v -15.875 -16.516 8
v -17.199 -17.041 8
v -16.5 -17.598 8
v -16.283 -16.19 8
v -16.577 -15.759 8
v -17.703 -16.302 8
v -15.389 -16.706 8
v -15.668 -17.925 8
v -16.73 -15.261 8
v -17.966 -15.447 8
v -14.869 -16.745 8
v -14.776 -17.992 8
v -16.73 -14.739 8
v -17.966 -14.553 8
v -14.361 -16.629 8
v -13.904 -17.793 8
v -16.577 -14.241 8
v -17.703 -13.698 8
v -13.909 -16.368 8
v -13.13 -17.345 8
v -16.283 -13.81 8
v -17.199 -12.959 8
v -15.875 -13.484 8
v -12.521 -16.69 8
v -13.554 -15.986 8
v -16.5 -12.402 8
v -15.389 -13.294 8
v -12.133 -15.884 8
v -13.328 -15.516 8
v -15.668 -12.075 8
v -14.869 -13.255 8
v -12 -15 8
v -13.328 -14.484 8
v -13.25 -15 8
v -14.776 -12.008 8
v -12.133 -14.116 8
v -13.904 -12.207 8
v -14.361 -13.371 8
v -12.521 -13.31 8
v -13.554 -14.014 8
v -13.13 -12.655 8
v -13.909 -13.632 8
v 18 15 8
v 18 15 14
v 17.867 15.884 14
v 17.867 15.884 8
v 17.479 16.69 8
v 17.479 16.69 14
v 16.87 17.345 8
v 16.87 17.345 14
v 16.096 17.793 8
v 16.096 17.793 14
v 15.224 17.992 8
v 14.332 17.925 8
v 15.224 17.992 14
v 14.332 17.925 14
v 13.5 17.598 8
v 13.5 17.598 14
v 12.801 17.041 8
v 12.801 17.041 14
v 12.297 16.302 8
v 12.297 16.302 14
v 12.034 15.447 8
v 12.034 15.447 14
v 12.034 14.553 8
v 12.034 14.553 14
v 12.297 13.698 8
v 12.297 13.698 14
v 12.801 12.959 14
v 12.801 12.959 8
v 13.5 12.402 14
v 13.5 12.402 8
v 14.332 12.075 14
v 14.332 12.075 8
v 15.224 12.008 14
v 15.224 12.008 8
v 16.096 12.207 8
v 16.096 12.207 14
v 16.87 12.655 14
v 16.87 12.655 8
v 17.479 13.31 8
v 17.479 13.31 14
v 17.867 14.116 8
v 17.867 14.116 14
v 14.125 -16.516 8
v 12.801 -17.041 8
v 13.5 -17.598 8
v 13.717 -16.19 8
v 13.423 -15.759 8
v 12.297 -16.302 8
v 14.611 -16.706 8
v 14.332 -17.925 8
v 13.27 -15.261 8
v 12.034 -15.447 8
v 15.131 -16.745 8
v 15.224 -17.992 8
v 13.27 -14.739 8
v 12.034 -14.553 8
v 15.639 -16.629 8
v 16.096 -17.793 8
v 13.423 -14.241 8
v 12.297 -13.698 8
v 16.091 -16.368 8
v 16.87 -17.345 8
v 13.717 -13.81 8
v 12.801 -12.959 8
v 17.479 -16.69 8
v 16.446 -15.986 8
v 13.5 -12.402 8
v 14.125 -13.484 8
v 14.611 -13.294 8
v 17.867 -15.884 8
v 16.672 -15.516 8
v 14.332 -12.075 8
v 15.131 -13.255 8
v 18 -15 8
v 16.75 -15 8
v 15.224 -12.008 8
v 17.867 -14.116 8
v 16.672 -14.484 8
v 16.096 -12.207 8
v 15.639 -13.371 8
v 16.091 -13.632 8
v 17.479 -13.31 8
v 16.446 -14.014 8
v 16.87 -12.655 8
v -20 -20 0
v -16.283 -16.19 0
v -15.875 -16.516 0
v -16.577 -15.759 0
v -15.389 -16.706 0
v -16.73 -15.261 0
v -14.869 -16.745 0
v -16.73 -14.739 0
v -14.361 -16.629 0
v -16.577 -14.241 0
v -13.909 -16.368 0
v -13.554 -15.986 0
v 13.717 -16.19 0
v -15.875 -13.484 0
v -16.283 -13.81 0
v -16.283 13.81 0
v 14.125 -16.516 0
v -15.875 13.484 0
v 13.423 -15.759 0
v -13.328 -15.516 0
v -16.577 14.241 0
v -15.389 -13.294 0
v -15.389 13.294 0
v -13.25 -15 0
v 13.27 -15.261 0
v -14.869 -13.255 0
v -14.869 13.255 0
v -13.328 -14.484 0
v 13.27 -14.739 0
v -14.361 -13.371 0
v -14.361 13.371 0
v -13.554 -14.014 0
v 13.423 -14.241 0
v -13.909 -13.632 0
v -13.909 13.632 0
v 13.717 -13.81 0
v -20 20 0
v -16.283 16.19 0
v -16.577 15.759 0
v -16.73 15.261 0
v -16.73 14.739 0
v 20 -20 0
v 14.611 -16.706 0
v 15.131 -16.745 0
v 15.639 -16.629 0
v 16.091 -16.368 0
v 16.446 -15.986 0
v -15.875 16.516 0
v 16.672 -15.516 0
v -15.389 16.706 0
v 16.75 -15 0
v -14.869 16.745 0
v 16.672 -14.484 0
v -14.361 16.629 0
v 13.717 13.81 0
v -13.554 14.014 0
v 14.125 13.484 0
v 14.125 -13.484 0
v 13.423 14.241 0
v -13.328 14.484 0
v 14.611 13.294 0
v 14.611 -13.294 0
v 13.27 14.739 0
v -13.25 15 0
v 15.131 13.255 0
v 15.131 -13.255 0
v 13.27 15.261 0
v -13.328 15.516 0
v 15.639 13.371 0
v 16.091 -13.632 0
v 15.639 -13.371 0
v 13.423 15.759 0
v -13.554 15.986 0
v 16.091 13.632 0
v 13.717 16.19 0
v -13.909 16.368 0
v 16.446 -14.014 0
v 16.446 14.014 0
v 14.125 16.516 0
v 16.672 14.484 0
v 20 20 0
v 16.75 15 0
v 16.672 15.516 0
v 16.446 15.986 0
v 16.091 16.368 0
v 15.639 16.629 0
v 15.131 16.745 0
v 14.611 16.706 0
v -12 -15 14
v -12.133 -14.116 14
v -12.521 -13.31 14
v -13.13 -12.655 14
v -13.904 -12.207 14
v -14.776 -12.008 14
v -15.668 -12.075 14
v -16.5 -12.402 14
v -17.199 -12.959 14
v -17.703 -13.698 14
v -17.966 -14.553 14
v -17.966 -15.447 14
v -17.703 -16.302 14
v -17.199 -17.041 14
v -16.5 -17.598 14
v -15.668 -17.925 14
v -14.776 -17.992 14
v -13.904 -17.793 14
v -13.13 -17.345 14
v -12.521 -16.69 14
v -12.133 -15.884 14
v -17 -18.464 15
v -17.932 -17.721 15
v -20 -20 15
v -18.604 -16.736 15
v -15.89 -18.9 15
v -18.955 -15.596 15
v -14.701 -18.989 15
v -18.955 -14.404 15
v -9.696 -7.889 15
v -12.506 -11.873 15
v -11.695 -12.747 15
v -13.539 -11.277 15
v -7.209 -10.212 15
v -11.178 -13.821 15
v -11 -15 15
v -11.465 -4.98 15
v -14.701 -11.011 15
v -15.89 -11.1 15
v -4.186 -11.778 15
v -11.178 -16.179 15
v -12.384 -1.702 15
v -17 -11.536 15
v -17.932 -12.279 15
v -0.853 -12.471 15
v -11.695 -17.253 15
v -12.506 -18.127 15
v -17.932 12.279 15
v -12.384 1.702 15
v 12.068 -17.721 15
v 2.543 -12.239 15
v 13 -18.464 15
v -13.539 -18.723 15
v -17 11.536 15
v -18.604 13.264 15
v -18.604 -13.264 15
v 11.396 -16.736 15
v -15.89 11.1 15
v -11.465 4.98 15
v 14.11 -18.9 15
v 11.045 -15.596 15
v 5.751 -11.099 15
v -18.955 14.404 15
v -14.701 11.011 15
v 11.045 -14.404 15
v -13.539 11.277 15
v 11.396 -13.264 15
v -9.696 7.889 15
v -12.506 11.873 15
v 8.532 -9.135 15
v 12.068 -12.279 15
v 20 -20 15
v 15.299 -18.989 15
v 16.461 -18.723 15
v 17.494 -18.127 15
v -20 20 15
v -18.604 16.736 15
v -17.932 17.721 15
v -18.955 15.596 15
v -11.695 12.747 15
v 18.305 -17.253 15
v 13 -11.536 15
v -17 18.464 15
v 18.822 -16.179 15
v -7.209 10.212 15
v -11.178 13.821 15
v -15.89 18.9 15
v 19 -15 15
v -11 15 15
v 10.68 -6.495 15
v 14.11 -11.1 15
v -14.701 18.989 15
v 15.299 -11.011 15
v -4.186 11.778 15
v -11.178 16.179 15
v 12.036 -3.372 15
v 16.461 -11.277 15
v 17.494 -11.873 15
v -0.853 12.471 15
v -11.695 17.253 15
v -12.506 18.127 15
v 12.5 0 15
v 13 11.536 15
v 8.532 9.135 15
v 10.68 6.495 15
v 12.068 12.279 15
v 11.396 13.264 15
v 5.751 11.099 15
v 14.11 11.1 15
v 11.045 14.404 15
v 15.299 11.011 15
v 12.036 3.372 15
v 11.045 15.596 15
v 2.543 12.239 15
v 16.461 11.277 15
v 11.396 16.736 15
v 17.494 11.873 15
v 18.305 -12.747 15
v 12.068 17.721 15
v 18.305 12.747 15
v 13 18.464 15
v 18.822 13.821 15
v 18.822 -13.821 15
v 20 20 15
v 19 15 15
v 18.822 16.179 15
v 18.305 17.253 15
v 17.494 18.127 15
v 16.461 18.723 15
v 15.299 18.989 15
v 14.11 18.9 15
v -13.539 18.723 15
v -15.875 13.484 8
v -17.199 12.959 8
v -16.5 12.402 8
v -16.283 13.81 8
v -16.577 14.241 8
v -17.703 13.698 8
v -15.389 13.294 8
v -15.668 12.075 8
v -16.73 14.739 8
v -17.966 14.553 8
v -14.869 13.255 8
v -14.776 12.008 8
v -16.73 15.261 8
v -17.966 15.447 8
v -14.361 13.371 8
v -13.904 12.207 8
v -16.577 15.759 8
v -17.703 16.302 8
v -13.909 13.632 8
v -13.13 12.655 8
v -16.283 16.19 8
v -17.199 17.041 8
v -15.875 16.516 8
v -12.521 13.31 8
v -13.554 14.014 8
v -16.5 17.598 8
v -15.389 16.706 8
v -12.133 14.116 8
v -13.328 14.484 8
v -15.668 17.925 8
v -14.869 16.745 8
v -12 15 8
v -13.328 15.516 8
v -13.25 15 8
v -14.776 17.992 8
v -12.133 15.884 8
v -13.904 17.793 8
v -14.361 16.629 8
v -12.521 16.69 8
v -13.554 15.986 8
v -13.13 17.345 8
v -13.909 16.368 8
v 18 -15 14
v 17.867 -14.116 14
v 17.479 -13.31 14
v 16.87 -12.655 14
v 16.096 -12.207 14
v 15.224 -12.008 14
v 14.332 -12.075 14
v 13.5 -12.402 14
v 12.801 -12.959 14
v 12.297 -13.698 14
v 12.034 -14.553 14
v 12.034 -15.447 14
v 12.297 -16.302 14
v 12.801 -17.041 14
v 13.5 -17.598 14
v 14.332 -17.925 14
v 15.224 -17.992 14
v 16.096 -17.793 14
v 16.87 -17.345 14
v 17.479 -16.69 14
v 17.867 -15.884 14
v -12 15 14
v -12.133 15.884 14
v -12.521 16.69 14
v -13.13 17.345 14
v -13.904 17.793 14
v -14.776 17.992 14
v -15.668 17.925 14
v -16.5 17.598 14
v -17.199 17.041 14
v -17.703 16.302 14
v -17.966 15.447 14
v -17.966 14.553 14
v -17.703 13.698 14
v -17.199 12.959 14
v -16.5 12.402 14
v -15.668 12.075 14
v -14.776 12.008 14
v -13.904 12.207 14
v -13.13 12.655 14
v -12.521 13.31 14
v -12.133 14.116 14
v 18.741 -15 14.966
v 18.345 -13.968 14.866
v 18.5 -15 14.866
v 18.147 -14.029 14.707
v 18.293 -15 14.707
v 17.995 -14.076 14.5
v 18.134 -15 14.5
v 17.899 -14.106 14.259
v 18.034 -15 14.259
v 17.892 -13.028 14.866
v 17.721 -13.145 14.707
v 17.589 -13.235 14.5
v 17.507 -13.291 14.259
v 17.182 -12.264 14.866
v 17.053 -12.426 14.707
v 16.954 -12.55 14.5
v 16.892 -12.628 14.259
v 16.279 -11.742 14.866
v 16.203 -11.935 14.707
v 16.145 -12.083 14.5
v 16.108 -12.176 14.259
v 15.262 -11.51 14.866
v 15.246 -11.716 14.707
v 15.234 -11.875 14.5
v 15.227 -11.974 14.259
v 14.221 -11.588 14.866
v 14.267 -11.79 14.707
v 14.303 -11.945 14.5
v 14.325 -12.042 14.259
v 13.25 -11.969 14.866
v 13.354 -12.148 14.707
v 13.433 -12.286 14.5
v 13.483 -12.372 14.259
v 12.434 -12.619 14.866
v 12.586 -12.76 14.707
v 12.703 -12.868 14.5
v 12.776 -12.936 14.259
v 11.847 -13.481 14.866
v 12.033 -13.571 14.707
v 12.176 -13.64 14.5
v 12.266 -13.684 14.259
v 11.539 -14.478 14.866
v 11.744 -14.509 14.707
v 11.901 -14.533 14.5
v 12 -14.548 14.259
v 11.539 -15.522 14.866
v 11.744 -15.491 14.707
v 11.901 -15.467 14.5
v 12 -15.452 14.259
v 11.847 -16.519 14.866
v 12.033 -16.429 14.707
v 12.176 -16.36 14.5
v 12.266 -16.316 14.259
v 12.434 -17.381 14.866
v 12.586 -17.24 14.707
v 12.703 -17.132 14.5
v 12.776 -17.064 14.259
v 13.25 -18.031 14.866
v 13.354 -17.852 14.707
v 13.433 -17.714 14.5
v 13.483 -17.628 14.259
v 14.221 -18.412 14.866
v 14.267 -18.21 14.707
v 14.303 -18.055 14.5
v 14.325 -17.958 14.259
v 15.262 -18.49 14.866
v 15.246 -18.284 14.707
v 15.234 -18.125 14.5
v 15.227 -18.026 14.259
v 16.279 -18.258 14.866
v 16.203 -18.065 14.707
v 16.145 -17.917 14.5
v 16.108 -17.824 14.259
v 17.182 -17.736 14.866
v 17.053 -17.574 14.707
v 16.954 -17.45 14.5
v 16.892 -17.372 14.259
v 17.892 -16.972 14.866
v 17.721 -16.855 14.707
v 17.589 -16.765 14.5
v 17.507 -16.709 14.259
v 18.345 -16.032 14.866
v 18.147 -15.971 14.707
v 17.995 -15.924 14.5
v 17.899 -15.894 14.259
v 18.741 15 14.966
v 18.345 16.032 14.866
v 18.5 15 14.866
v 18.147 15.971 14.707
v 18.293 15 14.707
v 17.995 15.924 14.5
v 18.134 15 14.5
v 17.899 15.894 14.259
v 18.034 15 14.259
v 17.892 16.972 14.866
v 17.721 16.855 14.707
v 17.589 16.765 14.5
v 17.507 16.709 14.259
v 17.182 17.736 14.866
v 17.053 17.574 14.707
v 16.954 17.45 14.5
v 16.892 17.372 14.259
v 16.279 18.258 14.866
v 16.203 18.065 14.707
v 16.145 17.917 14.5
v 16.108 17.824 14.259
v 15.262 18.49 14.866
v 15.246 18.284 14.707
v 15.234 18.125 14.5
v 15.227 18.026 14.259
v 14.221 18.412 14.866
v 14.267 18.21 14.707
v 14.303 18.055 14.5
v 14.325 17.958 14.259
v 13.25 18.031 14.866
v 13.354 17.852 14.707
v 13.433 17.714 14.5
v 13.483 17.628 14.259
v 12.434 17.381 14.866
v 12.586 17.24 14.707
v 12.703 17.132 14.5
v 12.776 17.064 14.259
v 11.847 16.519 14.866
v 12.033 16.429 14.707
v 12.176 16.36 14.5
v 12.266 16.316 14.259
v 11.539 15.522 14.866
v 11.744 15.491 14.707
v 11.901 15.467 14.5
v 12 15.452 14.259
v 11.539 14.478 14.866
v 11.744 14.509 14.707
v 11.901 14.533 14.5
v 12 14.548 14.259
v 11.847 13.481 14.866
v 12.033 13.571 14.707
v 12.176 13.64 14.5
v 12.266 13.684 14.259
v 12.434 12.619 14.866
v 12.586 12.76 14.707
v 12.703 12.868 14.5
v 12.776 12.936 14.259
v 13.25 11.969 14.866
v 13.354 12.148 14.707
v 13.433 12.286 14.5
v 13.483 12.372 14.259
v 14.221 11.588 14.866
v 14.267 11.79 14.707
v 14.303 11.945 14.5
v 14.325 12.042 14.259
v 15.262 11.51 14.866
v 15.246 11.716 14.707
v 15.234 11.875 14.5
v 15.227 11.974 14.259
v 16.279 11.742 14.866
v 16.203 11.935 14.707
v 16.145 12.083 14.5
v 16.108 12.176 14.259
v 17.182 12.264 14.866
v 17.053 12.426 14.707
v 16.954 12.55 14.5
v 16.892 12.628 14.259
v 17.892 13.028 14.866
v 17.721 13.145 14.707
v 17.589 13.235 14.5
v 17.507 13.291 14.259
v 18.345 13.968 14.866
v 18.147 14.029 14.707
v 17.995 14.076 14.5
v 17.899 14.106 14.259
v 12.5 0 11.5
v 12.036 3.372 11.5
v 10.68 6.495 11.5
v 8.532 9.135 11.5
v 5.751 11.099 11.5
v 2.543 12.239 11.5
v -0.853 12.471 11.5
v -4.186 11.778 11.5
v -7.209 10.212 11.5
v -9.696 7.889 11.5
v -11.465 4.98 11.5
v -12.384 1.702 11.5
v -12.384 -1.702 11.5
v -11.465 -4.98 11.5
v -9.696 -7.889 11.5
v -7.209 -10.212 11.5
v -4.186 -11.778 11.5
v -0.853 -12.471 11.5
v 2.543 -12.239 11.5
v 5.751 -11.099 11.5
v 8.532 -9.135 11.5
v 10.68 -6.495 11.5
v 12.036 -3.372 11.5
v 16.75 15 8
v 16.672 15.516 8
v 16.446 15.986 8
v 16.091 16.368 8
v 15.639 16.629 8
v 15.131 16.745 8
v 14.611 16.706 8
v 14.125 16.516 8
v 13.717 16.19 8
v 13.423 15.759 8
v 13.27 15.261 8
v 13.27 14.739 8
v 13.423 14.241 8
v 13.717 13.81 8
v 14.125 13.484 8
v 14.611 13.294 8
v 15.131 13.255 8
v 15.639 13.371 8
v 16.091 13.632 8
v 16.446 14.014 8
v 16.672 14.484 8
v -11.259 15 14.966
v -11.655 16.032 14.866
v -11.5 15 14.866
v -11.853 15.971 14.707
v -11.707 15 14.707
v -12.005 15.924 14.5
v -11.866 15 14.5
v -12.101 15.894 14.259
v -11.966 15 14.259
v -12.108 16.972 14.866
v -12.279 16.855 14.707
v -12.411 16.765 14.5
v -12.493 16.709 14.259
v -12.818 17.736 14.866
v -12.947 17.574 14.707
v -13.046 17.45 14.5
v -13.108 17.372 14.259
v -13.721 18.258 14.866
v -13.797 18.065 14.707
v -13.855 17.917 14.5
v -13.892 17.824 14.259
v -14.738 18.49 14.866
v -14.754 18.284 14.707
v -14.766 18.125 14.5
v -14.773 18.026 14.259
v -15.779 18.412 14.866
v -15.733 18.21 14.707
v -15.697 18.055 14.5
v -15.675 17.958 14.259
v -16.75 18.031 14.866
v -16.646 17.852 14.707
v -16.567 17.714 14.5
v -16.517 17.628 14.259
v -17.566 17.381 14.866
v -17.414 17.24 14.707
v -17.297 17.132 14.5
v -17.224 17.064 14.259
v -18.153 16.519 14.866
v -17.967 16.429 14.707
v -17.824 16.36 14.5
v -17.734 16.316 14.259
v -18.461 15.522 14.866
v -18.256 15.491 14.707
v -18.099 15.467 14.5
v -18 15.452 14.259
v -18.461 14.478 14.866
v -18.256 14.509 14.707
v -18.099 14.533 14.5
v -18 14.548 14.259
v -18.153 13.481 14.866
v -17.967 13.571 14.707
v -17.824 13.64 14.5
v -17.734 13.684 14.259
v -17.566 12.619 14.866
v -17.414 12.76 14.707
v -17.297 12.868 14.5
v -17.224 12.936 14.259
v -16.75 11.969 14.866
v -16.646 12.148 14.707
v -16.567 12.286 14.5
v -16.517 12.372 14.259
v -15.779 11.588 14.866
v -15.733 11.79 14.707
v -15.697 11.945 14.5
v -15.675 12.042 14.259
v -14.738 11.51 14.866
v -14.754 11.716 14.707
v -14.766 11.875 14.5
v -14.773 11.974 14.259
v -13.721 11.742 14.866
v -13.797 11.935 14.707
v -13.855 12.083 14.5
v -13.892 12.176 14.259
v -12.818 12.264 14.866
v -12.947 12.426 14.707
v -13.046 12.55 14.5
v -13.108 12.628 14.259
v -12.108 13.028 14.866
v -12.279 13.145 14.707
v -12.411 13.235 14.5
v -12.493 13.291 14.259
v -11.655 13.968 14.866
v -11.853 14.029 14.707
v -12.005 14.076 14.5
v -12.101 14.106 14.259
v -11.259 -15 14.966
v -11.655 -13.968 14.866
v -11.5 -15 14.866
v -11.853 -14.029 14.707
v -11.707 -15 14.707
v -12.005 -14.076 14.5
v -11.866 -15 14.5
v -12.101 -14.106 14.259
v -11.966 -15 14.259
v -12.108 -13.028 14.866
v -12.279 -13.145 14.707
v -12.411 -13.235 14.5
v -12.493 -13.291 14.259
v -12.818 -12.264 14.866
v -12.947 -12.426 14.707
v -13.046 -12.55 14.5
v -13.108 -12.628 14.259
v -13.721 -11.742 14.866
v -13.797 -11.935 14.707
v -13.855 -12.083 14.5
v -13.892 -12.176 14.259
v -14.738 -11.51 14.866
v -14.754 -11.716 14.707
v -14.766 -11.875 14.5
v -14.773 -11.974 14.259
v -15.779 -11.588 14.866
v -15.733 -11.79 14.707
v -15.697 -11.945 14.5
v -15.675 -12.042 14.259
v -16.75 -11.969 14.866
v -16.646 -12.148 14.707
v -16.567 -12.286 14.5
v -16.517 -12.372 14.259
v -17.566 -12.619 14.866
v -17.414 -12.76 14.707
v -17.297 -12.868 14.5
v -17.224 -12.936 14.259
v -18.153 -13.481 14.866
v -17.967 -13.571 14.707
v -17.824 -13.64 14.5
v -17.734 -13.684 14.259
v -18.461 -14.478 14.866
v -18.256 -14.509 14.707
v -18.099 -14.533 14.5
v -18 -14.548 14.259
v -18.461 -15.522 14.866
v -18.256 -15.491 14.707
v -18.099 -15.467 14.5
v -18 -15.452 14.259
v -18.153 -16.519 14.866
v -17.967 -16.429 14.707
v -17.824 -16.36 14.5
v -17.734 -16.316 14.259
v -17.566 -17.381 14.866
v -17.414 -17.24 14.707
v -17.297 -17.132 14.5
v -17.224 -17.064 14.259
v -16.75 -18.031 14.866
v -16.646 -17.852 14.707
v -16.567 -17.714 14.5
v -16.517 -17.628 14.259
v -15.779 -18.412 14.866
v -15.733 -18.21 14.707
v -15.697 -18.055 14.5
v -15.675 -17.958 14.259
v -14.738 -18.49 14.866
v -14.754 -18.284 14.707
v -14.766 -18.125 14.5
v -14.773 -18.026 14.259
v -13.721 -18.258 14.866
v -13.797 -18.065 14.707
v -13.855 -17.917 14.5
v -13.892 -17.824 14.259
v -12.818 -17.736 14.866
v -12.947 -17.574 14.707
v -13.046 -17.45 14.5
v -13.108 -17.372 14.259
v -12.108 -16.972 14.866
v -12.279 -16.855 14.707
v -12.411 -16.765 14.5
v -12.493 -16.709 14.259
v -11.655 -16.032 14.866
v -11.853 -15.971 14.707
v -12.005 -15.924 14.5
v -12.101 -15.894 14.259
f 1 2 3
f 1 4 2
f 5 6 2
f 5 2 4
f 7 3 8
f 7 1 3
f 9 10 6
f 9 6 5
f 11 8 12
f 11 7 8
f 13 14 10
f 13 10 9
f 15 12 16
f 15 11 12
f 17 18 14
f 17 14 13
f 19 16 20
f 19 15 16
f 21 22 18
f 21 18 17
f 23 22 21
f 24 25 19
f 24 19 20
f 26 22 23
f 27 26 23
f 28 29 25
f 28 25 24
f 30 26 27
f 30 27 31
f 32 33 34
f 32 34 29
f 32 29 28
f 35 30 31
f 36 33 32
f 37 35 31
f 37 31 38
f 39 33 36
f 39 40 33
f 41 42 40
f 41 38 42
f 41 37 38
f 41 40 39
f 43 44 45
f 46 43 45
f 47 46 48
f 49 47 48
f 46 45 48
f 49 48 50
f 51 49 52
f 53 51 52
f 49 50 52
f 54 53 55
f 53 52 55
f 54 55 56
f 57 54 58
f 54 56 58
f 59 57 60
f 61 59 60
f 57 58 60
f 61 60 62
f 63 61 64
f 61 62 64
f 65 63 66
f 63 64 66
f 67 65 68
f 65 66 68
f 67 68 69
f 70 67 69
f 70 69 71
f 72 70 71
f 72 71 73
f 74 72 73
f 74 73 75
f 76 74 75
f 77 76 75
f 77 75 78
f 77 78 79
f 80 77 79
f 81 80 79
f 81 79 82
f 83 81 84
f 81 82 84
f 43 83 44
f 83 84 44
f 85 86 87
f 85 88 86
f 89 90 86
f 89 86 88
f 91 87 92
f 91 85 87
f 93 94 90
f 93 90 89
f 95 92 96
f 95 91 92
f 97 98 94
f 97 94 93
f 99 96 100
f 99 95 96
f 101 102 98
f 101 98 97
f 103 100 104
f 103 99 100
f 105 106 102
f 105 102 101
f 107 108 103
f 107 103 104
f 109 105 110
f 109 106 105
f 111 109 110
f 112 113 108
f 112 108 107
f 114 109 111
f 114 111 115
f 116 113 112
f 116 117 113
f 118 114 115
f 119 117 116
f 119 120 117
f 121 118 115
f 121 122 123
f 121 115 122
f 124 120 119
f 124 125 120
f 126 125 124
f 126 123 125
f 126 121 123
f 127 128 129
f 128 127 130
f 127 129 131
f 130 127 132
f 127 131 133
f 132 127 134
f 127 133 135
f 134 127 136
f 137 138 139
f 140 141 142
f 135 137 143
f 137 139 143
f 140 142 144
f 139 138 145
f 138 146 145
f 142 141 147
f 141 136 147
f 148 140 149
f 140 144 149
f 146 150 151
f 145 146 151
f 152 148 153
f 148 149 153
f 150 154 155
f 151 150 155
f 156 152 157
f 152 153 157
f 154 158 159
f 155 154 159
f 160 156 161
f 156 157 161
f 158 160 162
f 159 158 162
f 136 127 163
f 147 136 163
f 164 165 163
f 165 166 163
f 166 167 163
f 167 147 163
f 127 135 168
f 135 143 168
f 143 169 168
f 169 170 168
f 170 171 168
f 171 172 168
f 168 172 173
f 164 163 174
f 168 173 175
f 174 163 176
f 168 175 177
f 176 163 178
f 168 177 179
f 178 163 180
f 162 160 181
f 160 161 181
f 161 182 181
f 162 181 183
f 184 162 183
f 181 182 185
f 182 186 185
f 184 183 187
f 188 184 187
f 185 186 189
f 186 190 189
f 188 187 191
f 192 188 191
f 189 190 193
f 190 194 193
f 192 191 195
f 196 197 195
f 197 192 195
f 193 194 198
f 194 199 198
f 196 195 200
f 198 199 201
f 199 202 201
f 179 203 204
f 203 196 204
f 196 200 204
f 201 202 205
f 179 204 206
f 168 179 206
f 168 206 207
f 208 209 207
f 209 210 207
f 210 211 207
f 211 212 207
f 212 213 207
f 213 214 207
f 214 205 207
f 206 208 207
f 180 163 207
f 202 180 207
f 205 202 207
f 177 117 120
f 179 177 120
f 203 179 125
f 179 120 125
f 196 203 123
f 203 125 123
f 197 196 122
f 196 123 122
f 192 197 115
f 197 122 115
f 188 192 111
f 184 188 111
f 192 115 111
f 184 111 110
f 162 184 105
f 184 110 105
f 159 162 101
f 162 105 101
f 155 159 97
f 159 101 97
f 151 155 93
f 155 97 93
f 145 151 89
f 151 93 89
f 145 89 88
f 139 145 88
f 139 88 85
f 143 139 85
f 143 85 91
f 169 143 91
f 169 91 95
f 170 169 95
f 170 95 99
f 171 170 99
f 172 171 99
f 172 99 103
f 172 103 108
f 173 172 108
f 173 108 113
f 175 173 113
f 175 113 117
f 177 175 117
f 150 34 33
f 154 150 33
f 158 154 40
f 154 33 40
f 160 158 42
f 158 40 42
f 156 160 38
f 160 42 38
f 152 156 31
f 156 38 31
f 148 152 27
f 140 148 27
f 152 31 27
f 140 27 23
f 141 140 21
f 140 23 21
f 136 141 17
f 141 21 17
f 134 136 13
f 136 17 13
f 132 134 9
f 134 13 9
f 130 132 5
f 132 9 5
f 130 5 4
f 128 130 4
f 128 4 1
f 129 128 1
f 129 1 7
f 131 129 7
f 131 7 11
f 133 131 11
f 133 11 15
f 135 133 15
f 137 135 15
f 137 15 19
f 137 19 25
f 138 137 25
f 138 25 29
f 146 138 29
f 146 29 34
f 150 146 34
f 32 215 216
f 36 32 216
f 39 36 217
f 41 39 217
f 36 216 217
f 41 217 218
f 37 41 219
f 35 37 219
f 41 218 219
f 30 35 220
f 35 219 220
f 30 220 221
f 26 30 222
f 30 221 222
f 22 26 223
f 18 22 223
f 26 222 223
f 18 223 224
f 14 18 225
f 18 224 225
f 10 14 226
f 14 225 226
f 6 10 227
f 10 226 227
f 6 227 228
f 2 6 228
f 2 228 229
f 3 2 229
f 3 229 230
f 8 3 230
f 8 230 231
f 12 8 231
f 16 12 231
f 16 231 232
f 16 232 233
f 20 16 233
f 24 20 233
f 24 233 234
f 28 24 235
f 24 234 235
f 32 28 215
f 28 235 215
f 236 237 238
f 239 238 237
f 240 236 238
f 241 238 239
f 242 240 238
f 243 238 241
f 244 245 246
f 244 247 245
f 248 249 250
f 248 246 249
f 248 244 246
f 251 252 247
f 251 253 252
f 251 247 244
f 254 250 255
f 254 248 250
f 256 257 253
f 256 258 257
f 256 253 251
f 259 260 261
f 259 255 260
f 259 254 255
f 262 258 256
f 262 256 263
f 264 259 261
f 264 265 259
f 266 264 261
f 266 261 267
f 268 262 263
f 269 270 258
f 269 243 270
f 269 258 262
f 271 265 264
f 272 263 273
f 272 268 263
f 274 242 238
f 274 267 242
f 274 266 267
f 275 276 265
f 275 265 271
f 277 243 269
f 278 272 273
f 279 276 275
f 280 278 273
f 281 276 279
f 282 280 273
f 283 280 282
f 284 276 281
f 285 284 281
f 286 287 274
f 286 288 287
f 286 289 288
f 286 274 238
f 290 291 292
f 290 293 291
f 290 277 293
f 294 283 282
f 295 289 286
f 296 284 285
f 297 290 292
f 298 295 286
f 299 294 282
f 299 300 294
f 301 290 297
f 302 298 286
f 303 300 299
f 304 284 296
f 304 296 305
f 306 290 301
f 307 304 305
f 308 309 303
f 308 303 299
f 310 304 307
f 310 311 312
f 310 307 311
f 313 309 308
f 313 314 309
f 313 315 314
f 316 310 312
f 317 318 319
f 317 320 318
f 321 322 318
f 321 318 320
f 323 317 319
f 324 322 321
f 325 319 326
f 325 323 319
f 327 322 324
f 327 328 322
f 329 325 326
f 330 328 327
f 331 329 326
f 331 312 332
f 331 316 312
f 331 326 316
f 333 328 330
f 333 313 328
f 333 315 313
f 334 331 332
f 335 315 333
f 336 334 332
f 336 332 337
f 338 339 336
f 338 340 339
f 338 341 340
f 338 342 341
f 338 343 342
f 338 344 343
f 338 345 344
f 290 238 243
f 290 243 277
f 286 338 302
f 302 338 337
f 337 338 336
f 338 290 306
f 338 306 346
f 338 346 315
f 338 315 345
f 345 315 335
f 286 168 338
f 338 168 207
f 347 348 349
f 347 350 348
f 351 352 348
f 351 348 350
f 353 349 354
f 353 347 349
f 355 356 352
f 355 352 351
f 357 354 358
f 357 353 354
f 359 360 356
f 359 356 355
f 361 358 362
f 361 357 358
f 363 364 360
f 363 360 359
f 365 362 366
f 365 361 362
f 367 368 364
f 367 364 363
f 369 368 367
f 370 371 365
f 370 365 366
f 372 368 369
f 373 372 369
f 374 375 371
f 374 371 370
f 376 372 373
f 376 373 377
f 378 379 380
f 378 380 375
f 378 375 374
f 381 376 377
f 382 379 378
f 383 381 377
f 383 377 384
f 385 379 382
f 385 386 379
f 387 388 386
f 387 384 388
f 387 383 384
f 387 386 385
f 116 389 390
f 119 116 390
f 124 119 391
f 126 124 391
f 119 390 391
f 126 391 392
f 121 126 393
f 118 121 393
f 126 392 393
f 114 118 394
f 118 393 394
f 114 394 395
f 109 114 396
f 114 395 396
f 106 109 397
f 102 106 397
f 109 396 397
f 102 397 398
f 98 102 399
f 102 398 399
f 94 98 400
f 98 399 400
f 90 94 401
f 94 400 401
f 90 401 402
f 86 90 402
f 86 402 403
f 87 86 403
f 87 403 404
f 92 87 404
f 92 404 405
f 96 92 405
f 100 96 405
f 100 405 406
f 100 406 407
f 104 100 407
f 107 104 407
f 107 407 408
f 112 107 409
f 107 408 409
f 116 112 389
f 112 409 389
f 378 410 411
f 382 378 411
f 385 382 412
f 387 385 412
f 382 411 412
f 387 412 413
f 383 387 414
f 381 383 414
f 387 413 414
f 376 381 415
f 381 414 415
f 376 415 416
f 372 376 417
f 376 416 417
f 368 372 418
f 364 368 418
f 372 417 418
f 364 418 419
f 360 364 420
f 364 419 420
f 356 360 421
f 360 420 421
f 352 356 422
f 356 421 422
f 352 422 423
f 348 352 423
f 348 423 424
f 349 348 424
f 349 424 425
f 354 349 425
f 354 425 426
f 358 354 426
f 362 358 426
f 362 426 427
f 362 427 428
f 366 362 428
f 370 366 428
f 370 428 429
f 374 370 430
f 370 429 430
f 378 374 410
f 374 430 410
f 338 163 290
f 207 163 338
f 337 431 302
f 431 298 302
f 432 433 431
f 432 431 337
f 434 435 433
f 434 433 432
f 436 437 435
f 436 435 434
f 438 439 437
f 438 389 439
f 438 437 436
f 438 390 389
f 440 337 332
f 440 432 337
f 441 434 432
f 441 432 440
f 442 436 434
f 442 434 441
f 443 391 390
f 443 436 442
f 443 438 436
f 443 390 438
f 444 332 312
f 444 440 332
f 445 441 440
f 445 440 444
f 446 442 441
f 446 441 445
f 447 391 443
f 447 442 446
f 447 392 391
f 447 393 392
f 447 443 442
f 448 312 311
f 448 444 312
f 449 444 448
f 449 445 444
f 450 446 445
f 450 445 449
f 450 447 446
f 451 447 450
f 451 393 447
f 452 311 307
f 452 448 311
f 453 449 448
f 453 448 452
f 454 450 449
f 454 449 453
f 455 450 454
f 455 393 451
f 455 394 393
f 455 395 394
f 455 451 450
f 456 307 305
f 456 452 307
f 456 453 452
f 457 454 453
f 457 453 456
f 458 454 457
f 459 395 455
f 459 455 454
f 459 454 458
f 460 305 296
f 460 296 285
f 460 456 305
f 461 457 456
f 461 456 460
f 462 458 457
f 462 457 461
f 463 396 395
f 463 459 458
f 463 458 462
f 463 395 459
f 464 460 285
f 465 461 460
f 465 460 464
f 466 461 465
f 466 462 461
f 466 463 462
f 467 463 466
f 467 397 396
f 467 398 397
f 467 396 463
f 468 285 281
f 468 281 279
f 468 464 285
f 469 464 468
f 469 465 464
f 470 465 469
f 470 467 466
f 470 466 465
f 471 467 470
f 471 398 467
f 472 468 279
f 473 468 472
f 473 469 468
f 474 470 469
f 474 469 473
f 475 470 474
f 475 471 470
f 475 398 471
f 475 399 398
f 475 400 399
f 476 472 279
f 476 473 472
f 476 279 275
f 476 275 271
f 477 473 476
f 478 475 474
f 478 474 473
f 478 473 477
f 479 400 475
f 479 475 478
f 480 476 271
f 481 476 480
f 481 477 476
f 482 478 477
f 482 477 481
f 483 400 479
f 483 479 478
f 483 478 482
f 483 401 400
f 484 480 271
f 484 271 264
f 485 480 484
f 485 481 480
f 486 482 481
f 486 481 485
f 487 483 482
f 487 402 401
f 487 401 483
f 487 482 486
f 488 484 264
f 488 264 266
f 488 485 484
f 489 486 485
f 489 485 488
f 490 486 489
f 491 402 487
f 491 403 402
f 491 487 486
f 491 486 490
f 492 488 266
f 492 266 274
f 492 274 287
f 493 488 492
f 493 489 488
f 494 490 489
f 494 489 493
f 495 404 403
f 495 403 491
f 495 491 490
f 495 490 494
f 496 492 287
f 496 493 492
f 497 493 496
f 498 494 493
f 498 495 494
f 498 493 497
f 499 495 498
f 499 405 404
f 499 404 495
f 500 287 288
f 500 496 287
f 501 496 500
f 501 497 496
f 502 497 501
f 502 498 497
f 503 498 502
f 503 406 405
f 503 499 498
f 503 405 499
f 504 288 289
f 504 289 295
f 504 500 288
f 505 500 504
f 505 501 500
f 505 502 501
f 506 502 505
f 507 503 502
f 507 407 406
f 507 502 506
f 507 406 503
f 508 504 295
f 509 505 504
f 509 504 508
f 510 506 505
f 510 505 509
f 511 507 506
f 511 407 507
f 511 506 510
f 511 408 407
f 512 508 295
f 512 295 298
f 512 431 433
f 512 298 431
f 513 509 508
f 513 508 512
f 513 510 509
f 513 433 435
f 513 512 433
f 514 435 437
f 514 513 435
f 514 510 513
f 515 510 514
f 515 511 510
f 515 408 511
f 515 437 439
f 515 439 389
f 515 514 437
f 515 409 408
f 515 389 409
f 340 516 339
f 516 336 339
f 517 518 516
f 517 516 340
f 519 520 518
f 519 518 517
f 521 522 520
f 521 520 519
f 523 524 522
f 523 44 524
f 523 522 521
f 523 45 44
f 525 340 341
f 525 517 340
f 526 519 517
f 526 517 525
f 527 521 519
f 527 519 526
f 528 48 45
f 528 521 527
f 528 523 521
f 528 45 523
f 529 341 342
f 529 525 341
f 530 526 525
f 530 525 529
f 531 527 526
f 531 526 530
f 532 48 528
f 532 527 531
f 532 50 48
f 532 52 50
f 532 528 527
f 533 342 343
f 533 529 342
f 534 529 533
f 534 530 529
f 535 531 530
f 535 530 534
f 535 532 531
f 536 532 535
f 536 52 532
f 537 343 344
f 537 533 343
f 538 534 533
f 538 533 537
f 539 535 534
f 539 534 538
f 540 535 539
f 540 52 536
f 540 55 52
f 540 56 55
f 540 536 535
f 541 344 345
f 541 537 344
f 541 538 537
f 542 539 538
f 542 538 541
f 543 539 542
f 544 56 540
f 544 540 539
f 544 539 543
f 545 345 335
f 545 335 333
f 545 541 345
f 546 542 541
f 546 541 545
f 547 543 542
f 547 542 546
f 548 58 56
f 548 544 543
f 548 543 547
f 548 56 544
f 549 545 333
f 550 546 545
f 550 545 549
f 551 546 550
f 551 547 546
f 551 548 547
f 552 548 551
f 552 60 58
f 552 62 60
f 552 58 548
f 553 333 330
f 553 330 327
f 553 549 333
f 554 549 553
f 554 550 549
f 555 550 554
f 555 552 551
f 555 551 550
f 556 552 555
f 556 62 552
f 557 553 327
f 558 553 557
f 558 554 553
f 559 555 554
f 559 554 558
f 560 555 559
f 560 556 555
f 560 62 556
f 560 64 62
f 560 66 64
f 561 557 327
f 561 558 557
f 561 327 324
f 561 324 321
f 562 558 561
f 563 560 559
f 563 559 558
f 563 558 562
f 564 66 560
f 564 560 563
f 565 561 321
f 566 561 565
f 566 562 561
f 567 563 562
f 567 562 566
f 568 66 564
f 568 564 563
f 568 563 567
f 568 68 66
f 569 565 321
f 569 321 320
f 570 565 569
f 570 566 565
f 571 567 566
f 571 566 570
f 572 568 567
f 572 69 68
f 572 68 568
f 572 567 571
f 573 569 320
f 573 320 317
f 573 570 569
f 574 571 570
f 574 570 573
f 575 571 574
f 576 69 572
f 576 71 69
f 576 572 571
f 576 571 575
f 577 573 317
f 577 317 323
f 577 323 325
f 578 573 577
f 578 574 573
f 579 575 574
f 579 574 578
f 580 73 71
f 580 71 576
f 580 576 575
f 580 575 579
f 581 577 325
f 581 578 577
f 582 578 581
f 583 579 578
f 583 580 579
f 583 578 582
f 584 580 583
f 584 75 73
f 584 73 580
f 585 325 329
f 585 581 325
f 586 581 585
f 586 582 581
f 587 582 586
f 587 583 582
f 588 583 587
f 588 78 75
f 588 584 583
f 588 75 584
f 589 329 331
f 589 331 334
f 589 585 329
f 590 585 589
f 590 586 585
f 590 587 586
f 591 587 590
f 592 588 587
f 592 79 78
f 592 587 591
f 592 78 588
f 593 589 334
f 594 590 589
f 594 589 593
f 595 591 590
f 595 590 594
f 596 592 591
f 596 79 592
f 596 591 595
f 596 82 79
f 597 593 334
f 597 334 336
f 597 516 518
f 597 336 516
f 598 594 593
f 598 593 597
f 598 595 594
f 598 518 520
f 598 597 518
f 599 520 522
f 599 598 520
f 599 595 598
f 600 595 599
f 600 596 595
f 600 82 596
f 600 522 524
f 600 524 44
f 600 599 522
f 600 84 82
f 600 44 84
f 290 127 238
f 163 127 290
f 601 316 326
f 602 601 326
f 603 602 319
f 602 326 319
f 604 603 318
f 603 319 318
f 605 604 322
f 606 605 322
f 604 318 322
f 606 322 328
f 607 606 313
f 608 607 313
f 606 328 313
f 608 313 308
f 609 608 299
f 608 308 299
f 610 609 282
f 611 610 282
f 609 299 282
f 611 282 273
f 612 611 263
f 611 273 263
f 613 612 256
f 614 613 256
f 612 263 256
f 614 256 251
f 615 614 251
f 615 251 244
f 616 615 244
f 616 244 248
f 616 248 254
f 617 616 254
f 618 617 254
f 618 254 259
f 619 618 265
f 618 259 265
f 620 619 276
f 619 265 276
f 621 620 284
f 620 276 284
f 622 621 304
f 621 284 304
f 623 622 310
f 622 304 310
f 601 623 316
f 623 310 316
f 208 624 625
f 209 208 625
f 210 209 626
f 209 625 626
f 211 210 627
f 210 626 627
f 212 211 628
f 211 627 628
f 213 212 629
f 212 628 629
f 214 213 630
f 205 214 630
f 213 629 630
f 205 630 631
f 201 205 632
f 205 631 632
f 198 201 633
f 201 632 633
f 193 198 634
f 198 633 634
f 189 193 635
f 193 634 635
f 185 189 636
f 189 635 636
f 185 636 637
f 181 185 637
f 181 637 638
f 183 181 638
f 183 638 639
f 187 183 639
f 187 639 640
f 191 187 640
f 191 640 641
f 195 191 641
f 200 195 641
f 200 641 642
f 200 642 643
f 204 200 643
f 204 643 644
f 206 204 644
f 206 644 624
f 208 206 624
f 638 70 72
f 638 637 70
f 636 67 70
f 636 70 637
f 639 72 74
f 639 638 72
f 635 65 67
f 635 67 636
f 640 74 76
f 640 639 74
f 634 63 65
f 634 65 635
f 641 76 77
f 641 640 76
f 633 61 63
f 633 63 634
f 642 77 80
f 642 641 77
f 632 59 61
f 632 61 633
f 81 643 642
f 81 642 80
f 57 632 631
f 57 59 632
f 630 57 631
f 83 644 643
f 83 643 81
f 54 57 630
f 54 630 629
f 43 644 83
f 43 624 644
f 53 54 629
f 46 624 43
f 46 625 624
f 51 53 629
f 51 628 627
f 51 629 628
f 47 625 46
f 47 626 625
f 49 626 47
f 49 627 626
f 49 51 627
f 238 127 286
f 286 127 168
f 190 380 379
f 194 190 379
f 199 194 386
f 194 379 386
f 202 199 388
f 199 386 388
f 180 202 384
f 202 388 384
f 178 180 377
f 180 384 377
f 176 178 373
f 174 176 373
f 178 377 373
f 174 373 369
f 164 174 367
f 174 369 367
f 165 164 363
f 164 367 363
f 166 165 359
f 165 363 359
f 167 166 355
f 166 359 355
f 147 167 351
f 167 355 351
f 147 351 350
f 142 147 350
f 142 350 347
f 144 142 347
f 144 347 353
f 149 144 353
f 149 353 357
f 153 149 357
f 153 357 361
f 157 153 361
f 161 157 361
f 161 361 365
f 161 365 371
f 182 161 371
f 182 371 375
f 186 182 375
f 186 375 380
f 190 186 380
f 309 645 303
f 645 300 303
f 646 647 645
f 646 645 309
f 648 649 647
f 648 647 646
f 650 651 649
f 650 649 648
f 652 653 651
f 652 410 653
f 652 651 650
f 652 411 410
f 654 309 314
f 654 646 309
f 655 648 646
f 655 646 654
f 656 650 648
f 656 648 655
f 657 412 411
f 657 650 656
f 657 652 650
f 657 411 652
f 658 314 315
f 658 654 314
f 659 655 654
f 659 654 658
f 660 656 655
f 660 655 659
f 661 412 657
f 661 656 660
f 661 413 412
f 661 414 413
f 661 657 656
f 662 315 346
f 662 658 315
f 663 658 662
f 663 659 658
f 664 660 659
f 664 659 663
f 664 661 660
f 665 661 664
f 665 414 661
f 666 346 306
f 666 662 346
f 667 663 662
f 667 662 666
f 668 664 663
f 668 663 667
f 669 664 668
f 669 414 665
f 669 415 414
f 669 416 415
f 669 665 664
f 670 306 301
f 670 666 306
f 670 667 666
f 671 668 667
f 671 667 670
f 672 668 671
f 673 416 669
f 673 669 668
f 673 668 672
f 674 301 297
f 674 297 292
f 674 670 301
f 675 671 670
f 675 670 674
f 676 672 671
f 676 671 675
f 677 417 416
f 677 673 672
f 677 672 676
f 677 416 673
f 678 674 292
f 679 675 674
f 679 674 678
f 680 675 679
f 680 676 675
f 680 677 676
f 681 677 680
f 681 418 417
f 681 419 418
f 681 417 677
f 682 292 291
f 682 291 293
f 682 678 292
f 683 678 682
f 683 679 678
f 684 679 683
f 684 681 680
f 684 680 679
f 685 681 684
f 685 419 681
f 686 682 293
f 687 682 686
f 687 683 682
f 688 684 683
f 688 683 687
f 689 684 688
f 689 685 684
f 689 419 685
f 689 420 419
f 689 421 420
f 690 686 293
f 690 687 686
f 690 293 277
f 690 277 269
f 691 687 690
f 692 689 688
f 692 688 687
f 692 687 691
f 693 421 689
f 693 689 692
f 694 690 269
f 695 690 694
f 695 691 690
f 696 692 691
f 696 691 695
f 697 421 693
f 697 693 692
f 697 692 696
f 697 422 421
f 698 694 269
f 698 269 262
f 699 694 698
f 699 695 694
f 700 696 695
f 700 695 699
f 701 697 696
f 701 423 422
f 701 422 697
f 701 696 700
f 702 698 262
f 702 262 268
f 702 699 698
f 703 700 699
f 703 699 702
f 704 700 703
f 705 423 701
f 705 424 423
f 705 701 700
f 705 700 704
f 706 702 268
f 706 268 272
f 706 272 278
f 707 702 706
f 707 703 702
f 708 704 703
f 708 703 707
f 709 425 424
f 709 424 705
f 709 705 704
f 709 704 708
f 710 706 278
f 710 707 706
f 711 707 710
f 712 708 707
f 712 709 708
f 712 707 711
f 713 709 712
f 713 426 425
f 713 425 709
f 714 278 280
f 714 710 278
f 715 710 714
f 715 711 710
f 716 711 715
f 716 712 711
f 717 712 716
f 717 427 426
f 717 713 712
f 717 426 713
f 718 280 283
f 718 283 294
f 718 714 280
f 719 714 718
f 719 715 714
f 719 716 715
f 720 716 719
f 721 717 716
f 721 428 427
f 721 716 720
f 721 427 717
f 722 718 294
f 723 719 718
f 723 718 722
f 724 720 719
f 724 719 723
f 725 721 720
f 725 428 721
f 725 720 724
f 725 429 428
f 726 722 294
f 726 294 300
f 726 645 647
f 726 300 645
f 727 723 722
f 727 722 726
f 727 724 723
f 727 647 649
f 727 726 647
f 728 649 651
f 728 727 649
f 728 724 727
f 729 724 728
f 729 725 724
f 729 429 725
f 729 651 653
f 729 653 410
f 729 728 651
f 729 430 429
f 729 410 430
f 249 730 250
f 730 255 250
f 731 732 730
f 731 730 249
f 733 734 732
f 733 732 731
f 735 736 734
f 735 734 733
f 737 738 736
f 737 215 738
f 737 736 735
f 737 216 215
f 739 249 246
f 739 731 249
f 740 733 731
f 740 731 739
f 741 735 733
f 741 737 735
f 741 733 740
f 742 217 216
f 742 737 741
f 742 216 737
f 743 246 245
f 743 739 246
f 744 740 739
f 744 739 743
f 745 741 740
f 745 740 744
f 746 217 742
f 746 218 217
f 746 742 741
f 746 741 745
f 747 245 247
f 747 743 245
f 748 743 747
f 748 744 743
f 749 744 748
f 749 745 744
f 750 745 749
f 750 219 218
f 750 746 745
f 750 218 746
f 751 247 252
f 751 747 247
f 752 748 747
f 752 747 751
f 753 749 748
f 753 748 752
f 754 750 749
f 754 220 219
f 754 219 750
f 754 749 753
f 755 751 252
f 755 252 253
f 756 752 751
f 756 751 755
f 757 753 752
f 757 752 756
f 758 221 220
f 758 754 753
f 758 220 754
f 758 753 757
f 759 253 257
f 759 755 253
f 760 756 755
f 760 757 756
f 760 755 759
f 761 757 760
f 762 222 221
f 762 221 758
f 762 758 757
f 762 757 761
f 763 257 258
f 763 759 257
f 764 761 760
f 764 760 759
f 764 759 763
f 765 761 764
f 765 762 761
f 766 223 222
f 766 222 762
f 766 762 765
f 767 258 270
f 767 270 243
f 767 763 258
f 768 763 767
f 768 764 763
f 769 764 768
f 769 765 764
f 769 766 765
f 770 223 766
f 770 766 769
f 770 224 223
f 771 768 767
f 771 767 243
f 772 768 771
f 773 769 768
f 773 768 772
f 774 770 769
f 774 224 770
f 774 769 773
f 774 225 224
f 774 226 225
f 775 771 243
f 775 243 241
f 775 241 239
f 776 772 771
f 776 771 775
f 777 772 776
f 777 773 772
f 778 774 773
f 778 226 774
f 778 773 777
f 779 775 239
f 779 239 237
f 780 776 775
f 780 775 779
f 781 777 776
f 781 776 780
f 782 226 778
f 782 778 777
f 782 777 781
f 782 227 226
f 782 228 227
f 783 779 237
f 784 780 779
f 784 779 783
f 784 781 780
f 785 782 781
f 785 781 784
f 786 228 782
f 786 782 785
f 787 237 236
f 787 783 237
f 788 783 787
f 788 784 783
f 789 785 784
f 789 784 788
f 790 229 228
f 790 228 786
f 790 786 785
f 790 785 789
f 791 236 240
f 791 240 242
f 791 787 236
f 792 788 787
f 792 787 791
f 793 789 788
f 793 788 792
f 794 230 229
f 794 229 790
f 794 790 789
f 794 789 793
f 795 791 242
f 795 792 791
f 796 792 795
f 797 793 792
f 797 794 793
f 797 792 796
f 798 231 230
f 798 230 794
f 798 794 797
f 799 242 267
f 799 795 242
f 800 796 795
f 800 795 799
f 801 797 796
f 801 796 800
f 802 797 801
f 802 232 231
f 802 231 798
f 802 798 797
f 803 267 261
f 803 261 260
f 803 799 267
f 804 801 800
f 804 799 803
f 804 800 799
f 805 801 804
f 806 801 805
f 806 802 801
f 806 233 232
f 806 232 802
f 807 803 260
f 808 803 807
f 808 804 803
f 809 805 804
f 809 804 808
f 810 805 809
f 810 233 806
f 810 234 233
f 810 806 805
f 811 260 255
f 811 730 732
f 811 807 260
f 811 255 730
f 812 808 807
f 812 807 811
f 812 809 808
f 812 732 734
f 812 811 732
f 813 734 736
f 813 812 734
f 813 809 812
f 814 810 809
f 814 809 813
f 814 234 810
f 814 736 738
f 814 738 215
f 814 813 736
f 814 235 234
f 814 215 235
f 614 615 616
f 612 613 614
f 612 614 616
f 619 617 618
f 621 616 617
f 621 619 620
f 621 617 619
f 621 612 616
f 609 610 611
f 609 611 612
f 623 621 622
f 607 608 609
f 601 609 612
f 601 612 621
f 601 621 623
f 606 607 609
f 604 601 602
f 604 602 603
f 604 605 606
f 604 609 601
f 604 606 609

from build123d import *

# Parameters (mm, degrees)
SKETCH1_W           = 40
SKETCH1_H           = 40
BOSS_EXTRUDE1_DEPTH = 15
SKETCH3_R           = 1.75
CUT_EXTRUDE2_DEPTH  = 16
SKETCH4_R           = 3
CUT_EXTRUDE3_DEPTH  = 7
FILLET1_R           = 1
SKETCH5_R           = 12.5
CUT_EXTRUDE4_DEPTH  = 3.5


with BuildPart() as part:
    # Sketch1 → Boss-Extrude1 (new body)
    with BuildSketch(Plane.XY):
        Rectangle(SKETCH1_W, SKETCH1_H)
    extrude(amount=BOSS_EXTRUDE1_DEPTH)

    # Sketch3 → Cut-Extrude2 (cut, through all)
    with BuildSketch(Plane.XY.offset(15)):
        with Locations((15, 15)):
            Circle(SKETCH3_R)
        with Locations((15, -15)):
            Circle(SKETCH3_R)
        with Locations((-15, 15)):
            Circle(SKETCH3_R)
        with Locations((-15, -15)):
            Circle(SKETCH3_R)
    extrude(amount=-CUT_EXTRUDE2_DEPTH, mode=Mode.SUBTRACT)

    # Sketch4 → Cut-Extrude3 (cut)
    with BuildSketch(Plane.XY.offset(15)):
        with Locations((15, 15)):
            Circle(SKETCH4_R)
        with Locations((15, -15)):
            Circle(SKETCH4_R)
        with Locations((-15, -15)):
            Circle(SKETCH4_R)
        with Locations((-15, 15)):
            Circle(SKETCH4_R)
    extrude(amount=-CUT_EXTRUDE3_DEPTH, mode=Mode.SUBTRACT)

    # Fillet1
    fillet1_edges = [part.edges().sort_by_distance(p)[0] for p in [
        (12, 15, 15),
        (12, -15, 15),
        (-18, -15, 15),
        (-18, 15, 15),
    ]]
    fillet(fillet1_edges, radius=FILLET1_R)

    # Sketch5 → Cut-Extrude4 (cut)
    with BuildSketch(Plane.XY.offset(15)):
        Circle(SKETCH5_R)
    extrude(amount=-CUT_EXTRUDE4_DEPTH, mode=Mode.SUBTRACT)


solid = part.part
